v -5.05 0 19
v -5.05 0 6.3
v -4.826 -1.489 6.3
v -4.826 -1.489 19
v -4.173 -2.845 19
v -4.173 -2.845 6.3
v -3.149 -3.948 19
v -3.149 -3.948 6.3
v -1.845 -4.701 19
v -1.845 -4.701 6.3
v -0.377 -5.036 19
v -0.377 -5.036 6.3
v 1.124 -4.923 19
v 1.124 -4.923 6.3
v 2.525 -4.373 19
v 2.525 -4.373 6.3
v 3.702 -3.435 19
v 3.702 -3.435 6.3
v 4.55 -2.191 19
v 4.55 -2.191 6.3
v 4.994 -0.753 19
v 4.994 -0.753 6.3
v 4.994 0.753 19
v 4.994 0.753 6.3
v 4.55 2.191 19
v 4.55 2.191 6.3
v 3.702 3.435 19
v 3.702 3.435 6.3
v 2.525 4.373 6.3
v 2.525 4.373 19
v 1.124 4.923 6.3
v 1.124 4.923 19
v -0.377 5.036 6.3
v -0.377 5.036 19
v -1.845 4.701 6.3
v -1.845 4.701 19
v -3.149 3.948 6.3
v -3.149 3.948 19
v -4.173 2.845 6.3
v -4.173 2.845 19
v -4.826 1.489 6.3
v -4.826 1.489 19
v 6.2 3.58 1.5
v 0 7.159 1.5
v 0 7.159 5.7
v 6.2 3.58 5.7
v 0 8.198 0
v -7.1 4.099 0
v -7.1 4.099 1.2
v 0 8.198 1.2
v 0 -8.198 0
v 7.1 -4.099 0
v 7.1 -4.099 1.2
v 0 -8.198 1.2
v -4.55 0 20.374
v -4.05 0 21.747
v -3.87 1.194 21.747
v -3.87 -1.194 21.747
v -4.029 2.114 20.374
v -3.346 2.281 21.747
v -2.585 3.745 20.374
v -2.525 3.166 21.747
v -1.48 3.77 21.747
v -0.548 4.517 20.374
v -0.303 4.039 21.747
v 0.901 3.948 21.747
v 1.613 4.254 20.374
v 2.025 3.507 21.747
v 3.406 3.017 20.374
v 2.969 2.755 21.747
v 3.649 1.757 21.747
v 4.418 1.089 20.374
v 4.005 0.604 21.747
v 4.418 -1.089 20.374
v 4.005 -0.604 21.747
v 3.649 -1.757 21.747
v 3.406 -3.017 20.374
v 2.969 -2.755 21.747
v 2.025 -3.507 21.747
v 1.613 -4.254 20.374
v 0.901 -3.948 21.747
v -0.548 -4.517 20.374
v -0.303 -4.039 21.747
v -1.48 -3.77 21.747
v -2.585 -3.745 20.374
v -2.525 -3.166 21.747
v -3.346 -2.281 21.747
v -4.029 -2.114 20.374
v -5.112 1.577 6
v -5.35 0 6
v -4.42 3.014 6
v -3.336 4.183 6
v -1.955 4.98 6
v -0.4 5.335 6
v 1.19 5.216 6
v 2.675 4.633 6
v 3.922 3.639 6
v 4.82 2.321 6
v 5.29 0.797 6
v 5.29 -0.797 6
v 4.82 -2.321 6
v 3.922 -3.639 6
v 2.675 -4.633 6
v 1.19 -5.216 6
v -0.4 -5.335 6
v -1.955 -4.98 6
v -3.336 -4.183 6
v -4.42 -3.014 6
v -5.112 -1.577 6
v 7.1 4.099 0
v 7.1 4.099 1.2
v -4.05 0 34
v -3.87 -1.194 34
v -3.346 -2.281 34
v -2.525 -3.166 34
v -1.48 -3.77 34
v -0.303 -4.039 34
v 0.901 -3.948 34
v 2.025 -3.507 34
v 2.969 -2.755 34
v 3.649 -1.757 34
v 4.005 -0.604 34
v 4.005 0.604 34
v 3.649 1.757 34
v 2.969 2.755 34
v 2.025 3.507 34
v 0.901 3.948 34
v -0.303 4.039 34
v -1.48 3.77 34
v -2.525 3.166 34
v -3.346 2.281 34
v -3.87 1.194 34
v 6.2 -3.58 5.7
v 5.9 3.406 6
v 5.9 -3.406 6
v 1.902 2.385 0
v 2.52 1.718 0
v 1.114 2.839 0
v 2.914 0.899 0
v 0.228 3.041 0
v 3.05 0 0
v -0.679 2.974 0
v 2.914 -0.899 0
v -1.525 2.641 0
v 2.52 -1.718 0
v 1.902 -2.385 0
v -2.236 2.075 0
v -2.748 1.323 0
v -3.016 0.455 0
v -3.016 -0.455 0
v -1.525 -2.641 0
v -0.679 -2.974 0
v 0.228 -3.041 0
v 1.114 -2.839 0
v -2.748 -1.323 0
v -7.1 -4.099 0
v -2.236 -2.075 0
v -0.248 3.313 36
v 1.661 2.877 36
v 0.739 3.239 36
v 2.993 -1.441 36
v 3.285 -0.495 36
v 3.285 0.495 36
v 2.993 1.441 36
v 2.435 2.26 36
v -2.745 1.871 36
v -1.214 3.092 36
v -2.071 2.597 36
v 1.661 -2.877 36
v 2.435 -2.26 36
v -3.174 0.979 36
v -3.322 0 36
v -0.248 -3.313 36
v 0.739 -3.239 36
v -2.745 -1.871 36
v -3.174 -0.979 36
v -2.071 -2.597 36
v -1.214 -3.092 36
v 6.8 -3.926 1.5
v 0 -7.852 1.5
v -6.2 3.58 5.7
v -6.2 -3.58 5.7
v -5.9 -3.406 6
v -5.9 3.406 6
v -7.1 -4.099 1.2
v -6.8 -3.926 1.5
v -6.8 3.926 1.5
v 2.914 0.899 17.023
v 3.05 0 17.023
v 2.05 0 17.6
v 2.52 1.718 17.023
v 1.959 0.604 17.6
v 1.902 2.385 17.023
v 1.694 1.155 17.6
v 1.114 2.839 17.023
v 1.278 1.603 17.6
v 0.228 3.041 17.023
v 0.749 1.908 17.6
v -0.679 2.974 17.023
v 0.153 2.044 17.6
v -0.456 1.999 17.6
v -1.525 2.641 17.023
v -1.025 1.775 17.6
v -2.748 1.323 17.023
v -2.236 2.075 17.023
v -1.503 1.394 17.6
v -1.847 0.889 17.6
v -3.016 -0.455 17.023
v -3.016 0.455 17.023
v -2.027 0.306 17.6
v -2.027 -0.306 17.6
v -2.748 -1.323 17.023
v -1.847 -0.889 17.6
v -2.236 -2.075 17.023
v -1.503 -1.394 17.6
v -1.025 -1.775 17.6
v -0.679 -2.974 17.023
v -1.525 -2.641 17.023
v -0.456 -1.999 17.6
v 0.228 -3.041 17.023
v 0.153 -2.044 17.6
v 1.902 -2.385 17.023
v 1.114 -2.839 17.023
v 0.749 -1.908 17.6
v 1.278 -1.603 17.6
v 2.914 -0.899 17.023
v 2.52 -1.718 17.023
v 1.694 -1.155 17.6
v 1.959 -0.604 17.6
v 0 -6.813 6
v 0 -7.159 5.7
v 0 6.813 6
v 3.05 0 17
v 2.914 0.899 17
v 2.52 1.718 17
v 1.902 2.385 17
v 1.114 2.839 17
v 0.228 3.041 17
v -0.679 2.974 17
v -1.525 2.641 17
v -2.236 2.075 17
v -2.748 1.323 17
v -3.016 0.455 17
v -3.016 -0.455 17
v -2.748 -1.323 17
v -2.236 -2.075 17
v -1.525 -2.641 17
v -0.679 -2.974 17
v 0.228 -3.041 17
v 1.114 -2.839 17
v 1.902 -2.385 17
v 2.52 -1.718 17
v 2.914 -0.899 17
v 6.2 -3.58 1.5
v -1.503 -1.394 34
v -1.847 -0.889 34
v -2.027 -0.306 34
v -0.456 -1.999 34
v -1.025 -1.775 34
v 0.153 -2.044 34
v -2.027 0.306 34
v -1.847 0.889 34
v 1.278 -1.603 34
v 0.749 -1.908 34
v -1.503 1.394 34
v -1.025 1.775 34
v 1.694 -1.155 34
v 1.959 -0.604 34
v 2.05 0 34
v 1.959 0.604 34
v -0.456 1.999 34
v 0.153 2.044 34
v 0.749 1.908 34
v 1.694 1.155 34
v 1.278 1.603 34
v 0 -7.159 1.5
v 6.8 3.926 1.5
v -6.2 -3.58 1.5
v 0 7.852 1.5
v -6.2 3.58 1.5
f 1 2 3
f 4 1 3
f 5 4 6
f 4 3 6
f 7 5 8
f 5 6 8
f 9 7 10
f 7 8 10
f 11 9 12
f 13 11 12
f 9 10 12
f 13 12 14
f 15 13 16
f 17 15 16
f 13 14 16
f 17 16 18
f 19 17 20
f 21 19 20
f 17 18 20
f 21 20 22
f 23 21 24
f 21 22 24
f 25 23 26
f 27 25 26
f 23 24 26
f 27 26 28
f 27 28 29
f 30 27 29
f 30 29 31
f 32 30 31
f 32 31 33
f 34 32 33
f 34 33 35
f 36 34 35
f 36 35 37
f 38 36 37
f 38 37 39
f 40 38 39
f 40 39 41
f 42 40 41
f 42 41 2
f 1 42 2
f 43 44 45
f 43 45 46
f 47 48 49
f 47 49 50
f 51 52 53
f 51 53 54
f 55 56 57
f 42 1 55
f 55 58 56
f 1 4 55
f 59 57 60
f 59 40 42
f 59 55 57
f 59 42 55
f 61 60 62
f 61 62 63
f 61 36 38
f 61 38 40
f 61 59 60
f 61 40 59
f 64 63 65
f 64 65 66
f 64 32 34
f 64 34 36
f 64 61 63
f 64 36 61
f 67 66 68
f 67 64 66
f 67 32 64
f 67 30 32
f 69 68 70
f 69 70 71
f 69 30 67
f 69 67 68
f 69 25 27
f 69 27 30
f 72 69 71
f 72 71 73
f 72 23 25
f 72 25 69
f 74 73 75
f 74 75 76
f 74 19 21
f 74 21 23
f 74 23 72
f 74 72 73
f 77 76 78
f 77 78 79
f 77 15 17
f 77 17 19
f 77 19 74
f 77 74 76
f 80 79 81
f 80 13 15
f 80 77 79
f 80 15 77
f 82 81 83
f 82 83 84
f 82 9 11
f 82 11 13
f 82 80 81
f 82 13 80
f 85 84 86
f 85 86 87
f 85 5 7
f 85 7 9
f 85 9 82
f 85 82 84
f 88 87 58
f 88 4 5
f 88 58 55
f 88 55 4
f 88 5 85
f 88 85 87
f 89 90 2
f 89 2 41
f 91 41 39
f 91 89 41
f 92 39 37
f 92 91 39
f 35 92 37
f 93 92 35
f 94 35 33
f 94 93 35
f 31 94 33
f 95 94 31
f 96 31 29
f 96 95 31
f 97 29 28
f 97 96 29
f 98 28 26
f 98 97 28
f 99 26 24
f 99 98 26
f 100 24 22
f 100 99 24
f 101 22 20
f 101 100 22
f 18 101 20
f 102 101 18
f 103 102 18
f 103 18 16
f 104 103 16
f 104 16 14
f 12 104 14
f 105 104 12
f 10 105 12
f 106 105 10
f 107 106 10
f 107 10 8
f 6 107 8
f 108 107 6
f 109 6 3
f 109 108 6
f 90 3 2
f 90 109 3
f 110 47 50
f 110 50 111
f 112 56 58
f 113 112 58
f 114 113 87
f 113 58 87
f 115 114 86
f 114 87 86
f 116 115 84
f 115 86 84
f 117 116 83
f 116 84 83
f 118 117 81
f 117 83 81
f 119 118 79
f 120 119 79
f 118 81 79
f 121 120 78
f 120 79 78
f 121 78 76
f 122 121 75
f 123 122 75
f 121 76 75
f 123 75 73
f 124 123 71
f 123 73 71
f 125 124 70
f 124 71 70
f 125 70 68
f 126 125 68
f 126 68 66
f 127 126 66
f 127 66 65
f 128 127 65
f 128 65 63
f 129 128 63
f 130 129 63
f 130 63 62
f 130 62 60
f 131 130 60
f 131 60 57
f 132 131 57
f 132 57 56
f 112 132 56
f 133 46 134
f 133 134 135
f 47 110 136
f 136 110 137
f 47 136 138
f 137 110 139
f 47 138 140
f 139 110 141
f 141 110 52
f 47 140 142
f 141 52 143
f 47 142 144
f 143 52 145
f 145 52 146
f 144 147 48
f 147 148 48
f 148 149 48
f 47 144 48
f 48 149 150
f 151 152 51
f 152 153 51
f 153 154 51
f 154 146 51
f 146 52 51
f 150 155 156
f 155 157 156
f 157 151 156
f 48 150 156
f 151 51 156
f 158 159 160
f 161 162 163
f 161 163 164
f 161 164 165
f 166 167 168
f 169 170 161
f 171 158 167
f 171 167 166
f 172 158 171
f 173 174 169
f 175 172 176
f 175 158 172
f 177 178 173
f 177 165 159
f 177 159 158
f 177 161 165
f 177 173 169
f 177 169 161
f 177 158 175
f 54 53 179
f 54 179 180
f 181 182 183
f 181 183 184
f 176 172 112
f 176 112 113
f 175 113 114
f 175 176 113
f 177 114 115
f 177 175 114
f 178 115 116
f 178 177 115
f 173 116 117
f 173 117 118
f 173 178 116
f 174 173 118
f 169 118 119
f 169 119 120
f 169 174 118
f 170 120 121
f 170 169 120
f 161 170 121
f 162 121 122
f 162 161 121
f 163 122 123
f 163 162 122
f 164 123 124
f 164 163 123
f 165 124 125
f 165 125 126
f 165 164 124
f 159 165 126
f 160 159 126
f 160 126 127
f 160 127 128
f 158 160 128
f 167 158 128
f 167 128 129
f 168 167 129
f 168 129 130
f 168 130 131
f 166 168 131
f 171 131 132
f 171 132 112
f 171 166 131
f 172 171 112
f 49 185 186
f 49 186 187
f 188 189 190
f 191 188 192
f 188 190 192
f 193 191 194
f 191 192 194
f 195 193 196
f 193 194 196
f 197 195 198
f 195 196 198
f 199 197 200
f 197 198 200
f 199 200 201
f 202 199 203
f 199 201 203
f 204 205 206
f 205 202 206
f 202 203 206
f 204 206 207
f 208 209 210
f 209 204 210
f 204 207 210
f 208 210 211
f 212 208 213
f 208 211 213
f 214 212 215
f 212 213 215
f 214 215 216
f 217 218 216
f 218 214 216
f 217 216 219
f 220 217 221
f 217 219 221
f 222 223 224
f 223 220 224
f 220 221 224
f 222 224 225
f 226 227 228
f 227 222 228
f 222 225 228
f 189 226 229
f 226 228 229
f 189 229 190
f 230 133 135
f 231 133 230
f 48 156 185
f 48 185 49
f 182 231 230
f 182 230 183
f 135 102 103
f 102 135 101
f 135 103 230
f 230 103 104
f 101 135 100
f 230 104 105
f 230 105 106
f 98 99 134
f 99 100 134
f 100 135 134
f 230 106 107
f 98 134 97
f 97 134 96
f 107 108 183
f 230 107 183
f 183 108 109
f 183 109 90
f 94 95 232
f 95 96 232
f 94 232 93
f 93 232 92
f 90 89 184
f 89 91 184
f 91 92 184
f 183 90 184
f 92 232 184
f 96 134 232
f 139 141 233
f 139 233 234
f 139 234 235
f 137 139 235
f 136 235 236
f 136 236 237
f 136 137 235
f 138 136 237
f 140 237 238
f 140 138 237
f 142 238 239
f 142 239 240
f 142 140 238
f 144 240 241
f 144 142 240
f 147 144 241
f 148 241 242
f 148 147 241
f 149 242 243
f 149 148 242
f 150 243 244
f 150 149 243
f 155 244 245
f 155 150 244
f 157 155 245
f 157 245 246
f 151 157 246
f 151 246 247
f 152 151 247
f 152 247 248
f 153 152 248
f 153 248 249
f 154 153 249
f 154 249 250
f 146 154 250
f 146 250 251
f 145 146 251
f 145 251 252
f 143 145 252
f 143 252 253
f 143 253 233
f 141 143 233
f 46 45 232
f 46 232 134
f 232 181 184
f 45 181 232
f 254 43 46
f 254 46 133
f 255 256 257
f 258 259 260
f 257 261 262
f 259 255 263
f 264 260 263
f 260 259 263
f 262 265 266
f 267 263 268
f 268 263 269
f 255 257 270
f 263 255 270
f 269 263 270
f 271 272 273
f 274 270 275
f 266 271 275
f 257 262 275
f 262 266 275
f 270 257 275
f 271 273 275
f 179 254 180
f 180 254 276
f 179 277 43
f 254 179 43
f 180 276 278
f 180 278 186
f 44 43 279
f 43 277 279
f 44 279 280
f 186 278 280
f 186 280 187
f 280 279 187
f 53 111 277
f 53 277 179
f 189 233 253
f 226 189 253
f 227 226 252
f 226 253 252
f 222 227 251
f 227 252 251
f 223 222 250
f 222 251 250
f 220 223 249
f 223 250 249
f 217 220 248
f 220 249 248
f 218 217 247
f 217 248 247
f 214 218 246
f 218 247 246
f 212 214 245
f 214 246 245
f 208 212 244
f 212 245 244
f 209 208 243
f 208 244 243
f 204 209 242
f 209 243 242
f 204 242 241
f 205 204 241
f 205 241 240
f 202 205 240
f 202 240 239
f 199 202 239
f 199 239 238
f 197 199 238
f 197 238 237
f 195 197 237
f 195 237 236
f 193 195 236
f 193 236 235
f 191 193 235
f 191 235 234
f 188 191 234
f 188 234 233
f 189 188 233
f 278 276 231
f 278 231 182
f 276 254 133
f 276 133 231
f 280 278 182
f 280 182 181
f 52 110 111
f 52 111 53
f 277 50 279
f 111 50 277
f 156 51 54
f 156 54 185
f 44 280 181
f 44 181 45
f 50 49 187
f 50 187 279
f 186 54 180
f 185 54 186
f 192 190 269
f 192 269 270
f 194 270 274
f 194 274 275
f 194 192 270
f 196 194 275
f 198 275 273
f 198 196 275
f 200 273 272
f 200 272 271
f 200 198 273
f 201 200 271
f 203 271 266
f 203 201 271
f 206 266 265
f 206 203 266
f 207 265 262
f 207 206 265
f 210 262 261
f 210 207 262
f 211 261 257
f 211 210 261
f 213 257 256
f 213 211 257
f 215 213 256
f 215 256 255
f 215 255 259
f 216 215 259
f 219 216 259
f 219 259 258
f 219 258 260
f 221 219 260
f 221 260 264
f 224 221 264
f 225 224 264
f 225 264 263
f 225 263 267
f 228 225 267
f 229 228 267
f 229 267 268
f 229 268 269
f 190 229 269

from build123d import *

# Parameters (mm, degrees)
BOSS_EXTRUDE1_DEPTH = 1.5
SKETCH1_8_R         = 4.05
BOSS_EXTRUDE3_DEPTH = 36
SKETCH1_9_R         = 5.05
BOSS_EXTRUDE4_DEPTH = 19
SHELL1_START        = 2
SHELL1_OUTLINE_R    = 3.05
SHELL1_DEPTH        = 15
SHELL1_START_2      = 17
SHELL1_2_OUTLINE_R  = 2.05
SHELL1_2_DEPTH      = 17
SKETCH1_10_R        = 3.05
CUT_EXTRUDE1_DEPTH  = 11
SKETCH1_3_R         = 3.05
BOSS_EXTRUDE2_DEPTH = 6
CHAMFER1_SIZE       = 2
CHAMFER1_SIZE2      = 0.727940469
CHAMFER2_SIZE       = 2.747477419
CHAMFER2_SIZE_2     = 1
CHAMFER3_SIZE       = 1.039230485
CHAMFER3_SIZE_2     = 0.6
CHAMFER5_SIZE       = 0.3


# Read off the part's stored shape, not the designer's step: Shell1
with BuildPart() as part:
    # Sketch1 → Boss-Extrude1 (new body)
    with BuildSketch(Plane.XY):
        Polygon((-7.1, 4.099186911), (0, 8.198373822), (7.1, 4.099186911), (7.1, -4.099186911), (0, -8.198373822), (-7.1, -4.099186911), align=None)
    extrude(amount=BOSS_EXTRUDE1_DEPTH)

    # Sketch1<8> → Boss-Extrude3 (add)
    with BuildSketch(Plane.XY):
        with Locations(Location((0, 0, 0), (0, 0, 180))):
            Circle(SKETCH1_8_R)
    extrude(amount=BOSS_EXTRUDE3_DEPTH)

    # Sketch1<9> → Boss-Extrude4 (add)
    with BuildSketch(Plane.XY):
        with Locations(Location((0, 0, 0), (0, 0, 180))):
            Circle(SKETCH1_9_R)
    extrude(amount=BOSS_EXTRUDE4_DEPTH)

    # Shell1 outline → Shell1 (cut)
    with BuildSketch(Plane.XY.offset(SHELL1_START)):
        Circle(SHELL1_OUTLINE_R)
    extrude(amount=SHELL1_DEPTH, mode=Mode.SUBTRACT)

    # Shell1 2 outline → Shell1 2 (cut)
    with BuildSketch(Plane.XY.offset(SHELL1_START_2)):
        Circle(SHELL1_2_OUTLINE_R)
    extrude(amount=SHELL1_2_DEPTH, mode=Mode.SUBTRACT)

    # Sketch1<10> → Cut-Extrude1 (cut)
    with BuildSketch(Plane.XY):
        Circle(SKETCH1_10_R)
    extrude(amount=CUT_EXTRUDE1_DEPTH, mode=Mode.SUBTRACT)

    # Sketch1<3> → Boss-Extrude2 (add)
    with BuildSketch(Plane.XY):
        Polygon((0, 7.159143338), (6.2, 3.579571669), (6.2, -3.579571669), (0, -7.159143338), (-6.2, -3.579571669), (-6.2, 3.579571669), align=None)
        Circle(SKETCH1_3_R, mode=Mode.SUBTRACT)
    extrude(amount=BOSS_EXTRUDE2_DEPTH)

    # Chamfer1
    chamfer1_edges = [part.edges().sort_by_distance(p)[0] for p in [
        (4.05, 0, 36),
    ]]
    chamfer1_side = [part.faces().sort_by_distance(p)[0] for p in [
        (4.05, 0, 27.5),
    ]]
    chamfer(chamfer1_edges, length=CHAMFER1_SIZE, length2=CHAMFER1_SIZE2, reference=chamfer1_side[0])

    # Chamfer2
    # the kernel refuses this chamfer: 2.747477419, 1 mm, written as the material it adds along each edge
    with BuildSketch(Plane(origin=(0, 0, 19), x_dir=(-1, 0, 0), z_dir=(0, -1, 0))) as chamfer2_piece_1_section:
        Polygon((4.05, -CHAMFER2_SIZE), (4.05 + CHAMFER2_SIZE_2, 0), (4.05, 0), align=None)
    chamfer2_piece_1 = revolve(axis=Axis((0, 0, 19), (0, 0, -1)), mode=Mode.PRIVATE)
    chamfer2_piece_1 = chamfer2_piece_1 & Plane(origin=(0, 0, 20.413276919), x_dir=(-1, 0, 0), z_dir=(0, 0, -1)) * Cylinder(5.05, 21, mode=Mode.PRIVATE)
    add(chamfer2_piece_1)

    # Chamfer3
    # the kernel refuses this chamfer: 1.039230485, 0.6 mm, written as the material it takes off along each edge
    with BuildSketch(Plane(origin=(0, 0, 17), x_dir=(1, 0, 0), z_dir=(0, -1, 0))) as chamfer3_piece_1_section:
        Polygon((2.05 + CHAMFER3_SIZE, 0), (2.05, CHAMFER3_SIZE_2), (2.05, 0), align=None)
    chamfer3_piece_1 = revolve(axis=Axis((0, 0, 17), (0, 0, 1)), mode=Mode.PRIVATE)
    chamfer3_piece_1 = chamfer3_piece_1 & Plane(origin=(0, 0, 17.306641595), x_dir=(1, 0, 0), z_dir=(0, 0, -1)) * Cylinder(3.05, 13, mode=Mode.PRIVATE)
    add(chamfer3_piece_1, mode=Mode.SUBTRACT)

    # Chamfer5
    chamfer5_edges = [part.edges().sort_by_distance(p)[0] for p in [
        (3.55, 6.148780367, 1.5),
        (7.1, 0, 1.5),
        (3.55, -6.148780367, 1.5),
        (-3.55, -6.148780367, 1.5),
        (5.05, 0, 6),
        (-7.1, 0, 1.5),
        (-3.1, -5.369357503, 6),
        (3.1, -5.369357503, 6),
        (6.2, 0, 6),
        (3.1, 5.369357503, 6),
        (-3.1, 5.369357503, 6),
        (-6.2, 0, 6),
        (-3.55, 6.148780367, 1.5),
    ]]
    chamfer(chamfer5_edges, length=CHAMFER5_SIZE)


solid = part.part
